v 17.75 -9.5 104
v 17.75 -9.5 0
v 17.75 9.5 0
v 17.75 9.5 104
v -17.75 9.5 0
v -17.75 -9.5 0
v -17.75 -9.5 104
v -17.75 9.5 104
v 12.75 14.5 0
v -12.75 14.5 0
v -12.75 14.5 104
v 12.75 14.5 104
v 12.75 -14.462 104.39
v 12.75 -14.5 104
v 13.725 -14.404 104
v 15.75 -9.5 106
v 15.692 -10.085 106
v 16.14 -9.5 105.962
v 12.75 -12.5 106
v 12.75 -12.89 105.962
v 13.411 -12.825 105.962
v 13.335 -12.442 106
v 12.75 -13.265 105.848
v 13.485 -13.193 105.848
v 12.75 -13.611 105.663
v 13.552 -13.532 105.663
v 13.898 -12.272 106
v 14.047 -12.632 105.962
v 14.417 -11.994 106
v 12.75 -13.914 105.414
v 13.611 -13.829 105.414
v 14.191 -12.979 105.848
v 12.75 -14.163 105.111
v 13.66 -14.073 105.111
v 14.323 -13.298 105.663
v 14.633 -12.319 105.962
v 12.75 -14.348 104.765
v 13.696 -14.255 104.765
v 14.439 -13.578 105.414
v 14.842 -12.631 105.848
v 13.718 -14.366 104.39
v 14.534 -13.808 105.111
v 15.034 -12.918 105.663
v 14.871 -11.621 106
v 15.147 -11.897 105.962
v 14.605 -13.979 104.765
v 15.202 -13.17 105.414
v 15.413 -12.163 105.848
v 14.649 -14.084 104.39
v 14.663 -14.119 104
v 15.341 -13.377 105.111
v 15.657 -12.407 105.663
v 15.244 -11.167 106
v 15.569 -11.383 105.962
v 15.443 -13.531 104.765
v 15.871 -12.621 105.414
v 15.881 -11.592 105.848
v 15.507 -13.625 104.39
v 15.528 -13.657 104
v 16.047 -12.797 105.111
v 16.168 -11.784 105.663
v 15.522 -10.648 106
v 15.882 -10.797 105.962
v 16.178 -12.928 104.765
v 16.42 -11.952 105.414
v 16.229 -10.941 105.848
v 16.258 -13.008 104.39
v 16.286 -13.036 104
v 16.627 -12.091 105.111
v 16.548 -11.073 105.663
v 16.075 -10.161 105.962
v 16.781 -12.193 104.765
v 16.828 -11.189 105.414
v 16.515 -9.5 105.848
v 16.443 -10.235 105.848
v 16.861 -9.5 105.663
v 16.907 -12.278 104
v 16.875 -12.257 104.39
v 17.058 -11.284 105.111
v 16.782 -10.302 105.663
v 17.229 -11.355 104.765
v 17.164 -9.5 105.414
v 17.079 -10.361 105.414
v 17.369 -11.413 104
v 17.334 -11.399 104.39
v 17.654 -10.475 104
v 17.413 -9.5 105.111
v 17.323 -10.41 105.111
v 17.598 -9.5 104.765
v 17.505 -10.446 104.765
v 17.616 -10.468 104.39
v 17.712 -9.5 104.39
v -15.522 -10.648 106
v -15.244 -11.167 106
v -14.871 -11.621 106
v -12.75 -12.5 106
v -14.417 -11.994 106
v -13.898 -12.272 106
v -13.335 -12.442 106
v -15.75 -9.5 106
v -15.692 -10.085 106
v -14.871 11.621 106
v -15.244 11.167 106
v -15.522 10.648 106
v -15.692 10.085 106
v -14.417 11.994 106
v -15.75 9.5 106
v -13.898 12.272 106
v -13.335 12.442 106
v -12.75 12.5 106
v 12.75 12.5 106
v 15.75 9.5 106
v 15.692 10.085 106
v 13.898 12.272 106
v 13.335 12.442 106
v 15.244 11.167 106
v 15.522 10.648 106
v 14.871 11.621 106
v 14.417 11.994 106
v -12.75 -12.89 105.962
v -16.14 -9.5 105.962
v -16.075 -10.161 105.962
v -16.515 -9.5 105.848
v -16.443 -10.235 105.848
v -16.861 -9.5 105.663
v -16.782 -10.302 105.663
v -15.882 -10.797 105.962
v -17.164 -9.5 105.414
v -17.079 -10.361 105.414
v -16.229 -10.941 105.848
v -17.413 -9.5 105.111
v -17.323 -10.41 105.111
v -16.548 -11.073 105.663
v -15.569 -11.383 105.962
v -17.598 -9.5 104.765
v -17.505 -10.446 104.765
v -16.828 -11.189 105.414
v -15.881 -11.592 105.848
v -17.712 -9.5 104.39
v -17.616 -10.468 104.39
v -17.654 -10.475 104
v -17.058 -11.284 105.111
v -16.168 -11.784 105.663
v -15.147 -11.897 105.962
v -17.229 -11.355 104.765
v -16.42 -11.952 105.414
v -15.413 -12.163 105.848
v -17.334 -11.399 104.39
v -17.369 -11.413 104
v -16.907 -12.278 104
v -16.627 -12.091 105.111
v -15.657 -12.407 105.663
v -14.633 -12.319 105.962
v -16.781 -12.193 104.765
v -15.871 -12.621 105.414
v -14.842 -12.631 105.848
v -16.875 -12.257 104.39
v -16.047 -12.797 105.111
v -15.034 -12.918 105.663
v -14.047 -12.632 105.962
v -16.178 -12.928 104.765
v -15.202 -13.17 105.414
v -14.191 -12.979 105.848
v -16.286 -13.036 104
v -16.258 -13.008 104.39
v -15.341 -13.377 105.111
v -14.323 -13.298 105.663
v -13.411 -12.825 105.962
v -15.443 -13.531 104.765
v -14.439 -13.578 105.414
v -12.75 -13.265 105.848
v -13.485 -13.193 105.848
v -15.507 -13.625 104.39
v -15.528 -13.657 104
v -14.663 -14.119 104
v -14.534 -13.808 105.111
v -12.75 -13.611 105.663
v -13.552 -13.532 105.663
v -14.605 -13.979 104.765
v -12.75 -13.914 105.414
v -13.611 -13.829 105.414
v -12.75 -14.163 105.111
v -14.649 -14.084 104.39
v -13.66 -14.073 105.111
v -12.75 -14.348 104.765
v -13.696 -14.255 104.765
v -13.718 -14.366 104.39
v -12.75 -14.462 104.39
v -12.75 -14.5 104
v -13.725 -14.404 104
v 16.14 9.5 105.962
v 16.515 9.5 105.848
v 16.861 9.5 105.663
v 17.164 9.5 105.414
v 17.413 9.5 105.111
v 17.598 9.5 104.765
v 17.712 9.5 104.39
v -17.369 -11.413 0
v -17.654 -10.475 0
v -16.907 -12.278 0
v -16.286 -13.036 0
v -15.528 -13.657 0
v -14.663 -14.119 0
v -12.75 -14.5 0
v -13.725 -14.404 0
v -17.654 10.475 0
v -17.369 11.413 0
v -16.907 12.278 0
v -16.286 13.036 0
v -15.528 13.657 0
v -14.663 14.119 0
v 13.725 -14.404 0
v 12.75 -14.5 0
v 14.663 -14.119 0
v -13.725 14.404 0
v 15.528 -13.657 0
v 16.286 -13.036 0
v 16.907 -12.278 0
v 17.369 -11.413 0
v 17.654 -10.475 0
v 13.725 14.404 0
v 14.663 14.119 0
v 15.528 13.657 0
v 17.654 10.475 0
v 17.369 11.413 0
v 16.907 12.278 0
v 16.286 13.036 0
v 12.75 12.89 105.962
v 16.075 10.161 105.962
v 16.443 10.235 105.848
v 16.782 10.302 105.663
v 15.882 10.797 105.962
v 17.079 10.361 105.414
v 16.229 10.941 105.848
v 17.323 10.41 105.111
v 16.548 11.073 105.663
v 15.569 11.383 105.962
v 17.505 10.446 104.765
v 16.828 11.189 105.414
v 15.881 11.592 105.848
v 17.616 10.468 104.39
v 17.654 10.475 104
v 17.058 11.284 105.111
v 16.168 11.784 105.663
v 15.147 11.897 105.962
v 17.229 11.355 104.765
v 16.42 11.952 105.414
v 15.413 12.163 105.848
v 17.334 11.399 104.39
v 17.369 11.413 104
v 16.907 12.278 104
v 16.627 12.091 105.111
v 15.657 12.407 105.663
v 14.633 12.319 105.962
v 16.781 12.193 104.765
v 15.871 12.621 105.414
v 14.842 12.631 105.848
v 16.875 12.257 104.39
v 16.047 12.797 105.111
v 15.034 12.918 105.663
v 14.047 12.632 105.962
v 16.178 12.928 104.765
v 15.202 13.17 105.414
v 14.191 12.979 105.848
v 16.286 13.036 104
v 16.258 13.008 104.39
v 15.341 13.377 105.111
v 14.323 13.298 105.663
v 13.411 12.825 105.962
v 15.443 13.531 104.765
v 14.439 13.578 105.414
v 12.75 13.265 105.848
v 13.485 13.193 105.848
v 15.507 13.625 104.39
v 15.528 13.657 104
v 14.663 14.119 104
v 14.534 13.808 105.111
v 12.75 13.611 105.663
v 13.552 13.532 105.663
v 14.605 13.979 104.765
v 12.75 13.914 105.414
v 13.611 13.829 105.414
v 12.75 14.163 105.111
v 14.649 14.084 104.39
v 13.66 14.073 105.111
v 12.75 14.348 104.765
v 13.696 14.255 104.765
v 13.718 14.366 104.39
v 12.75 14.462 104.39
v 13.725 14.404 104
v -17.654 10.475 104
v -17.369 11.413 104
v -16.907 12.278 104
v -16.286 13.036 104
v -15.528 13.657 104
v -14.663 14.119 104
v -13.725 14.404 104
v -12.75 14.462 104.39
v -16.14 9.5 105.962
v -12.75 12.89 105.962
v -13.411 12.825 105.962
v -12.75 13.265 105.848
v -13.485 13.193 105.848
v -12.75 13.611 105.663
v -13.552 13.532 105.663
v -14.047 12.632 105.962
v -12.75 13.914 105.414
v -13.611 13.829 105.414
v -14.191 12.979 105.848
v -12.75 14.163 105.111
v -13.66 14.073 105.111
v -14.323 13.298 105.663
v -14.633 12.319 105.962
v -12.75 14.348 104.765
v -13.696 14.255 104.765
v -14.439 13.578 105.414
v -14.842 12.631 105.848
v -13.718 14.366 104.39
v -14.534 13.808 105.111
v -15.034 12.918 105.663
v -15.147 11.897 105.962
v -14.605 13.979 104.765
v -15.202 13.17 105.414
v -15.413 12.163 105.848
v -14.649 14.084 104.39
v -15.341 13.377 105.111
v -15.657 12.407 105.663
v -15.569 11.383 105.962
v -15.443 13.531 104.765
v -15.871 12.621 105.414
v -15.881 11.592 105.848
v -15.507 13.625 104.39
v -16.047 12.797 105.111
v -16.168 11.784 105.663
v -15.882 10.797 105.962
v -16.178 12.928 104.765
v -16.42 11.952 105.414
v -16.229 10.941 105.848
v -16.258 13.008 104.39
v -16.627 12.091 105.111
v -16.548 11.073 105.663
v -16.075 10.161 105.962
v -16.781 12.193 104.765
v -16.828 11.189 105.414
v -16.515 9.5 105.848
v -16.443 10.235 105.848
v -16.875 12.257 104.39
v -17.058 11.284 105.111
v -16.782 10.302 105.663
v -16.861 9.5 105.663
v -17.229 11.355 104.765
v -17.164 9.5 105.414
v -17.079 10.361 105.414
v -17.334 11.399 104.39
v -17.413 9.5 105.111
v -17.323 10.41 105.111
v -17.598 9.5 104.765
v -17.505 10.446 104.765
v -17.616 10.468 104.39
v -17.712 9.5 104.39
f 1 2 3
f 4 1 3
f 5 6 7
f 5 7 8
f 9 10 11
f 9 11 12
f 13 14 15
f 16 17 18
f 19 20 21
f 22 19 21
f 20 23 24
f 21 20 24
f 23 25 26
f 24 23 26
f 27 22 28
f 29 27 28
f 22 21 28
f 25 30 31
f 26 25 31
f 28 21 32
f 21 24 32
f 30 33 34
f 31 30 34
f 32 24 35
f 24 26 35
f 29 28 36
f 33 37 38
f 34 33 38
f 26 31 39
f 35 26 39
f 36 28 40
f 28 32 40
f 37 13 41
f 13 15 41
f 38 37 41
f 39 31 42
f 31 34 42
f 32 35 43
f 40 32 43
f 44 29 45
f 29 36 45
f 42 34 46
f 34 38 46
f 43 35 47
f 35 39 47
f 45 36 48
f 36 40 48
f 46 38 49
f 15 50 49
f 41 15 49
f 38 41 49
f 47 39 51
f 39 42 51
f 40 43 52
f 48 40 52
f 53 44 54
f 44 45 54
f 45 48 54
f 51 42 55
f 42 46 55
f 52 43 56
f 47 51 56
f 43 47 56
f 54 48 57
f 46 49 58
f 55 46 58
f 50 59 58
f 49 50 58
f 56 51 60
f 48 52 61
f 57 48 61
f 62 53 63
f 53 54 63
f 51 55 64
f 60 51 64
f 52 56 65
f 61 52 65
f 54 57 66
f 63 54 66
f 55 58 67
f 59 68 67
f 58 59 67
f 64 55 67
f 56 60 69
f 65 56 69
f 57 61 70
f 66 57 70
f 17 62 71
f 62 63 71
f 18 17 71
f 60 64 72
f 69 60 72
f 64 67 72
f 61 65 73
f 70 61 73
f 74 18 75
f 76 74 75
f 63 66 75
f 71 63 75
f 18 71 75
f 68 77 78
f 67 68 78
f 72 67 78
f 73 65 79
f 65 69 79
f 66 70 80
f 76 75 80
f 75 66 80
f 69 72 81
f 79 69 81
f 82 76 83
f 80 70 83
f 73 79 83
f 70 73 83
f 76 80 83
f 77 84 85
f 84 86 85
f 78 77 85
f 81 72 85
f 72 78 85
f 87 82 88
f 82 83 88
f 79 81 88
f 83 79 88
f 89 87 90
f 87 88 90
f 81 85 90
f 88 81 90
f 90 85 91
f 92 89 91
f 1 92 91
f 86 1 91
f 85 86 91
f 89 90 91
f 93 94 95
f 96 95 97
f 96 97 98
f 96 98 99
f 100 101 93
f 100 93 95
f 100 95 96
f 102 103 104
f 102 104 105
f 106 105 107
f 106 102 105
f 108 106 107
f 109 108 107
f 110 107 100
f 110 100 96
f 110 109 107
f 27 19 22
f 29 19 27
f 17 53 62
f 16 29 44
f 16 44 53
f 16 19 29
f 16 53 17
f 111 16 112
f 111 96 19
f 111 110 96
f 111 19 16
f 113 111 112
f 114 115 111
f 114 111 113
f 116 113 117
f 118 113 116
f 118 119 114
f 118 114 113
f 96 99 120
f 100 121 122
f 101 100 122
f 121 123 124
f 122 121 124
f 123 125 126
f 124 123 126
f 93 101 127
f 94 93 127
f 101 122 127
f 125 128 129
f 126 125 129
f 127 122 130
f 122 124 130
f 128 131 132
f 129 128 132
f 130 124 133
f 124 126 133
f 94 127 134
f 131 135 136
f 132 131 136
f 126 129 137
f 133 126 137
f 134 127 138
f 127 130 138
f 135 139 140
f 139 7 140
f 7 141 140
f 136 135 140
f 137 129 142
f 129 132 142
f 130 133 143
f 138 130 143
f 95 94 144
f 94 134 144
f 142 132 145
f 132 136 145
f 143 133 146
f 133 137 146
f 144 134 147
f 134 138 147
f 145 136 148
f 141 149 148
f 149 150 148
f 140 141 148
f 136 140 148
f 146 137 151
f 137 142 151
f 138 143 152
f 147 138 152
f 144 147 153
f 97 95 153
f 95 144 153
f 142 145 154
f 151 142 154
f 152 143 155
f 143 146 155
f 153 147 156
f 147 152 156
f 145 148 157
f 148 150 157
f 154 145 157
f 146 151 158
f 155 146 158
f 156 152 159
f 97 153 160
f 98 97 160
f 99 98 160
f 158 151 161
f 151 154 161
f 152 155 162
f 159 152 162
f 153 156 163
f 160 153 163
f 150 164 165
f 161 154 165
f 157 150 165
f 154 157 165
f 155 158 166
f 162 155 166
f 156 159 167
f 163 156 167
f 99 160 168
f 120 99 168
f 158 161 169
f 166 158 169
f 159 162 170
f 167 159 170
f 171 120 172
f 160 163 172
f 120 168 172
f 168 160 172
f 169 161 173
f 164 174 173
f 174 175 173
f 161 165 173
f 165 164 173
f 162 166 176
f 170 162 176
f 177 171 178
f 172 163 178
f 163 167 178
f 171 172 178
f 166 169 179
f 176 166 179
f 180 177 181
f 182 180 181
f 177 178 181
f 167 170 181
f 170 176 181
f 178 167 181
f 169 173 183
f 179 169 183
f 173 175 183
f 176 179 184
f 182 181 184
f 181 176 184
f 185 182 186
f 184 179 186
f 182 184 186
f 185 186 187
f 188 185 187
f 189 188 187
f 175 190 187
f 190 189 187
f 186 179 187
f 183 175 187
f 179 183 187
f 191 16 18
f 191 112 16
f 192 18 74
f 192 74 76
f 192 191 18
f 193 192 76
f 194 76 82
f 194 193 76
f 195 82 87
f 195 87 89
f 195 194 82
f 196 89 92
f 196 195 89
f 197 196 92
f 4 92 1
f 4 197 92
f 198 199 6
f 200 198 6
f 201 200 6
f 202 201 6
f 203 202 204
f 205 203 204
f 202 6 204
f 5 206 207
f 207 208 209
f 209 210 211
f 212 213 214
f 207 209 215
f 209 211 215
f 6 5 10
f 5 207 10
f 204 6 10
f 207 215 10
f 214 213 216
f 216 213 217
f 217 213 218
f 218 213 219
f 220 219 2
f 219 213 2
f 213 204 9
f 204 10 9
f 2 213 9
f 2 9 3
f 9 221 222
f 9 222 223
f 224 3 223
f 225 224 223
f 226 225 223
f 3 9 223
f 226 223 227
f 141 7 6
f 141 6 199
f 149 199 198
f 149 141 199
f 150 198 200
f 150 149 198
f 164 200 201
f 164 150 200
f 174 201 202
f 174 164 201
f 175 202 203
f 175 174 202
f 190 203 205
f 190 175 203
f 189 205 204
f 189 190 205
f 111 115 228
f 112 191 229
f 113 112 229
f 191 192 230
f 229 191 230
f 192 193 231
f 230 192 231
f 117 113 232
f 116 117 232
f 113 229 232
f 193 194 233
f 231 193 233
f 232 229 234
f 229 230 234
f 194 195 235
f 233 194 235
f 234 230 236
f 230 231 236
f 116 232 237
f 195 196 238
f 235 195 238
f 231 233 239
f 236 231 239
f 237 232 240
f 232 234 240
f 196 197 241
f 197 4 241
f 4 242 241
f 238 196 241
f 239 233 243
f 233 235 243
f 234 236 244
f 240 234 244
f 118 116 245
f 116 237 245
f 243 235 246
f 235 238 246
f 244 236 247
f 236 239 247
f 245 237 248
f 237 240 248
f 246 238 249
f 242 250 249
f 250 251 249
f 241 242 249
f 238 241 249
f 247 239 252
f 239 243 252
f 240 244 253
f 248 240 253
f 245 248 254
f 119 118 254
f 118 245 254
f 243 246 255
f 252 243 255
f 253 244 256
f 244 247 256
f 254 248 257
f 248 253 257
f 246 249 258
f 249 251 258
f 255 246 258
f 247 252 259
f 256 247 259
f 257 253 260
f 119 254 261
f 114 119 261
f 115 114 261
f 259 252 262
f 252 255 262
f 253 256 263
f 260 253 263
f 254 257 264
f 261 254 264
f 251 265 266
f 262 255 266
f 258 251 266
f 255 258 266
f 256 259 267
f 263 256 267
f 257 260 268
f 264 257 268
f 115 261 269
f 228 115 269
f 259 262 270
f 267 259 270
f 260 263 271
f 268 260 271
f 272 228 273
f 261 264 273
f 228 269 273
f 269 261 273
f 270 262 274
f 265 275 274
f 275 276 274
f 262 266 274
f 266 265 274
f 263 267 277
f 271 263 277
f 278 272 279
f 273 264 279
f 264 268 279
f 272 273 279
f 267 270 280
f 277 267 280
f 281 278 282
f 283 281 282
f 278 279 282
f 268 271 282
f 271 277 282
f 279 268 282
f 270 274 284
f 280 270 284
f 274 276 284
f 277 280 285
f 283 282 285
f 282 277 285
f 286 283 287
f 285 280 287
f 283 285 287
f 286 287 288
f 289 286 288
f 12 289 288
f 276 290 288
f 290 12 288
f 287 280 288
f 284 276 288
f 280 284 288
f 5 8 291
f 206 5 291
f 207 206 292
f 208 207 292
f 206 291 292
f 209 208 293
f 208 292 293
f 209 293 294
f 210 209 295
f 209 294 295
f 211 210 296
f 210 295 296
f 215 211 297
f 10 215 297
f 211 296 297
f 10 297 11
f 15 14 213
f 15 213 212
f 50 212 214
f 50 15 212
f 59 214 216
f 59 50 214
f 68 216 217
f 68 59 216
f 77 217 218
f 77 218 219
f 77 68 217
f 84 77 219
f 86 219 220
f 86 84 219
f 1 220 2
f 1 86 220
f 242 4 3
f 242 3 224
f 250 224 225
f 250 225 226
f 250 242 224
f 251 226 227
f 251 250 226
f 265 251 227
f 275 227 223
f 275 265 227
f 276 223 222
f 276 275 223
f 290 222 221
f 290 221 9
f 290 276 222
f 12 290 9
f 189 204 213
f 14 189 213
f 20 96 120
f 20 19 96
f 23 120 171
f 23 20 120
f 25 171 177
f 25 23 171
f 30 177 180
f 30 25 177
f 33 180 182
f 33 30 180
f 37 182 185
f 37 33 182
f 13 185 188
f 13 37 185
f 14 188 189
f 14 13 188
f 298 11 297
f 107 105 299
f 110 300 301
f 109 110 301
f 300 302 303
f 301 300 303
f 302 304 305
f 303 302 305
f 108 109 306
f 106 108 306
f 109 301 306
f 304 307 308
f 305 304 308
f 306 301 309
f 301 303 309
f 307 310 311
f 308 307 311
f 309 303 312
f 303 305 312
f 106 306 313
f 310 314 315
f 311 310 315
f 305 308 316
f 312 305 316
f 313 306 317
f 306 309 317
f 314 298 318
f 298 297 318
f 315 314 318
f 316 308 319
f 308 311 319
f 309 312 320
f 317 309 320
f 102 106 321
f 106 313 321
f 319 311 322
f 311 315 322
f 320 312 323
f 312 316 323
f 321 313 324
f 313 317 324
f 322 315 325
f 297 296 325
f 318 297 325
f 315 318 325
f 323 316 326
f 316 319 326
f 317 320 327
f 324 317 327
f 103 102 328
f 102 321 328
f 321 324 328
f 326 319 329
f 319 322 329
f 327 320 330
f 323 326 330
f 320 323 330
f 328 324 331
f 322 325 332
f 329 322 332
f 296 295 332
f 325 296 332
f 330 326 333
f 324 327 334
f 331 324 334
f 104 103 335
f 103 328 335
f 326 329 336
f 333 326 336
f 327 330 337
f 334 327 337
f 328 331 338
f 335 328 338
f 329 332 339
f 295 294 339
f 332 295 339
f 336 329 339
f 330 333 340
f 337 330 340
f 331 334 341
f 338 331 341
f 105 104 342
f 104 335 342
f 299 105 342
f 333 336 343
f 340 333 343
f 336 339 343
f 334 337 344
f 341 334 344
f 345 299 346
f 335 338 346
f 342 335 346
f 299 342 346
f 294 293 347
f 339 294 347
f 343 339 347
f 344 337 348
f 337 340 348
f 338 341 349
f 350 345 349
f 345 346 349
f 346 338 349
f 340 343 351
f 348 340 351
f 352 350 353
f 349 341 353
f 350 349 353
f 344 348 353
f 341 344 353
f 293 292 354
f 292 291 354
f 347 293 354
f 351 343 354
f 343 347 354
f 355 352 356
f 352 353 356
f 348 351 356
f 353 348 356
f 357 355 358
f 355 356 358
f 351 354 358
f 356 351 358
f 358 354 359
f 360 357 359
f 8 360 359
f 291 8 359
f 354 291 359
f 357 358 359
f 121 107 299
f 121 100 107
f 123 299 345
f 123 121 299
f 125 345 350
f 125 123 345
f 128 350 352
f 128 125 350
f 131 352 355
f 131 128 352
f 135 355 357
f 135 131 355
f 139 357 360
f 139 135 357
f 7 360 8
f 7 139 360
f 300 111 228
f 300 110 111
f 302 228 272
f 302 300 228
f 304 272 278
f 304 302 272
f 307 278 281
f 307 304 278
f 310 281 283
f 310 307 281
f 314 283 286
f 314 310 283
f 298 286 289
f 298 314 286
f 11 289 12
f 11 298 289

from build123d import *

# Parameters (mm, degrees)
SKETCH_1_W      = 35.5
SKETCH_1_H      = 29
EXTRUDE_1_DEPTH = 106
FILLET_1_R      = 5
FILLET_2_R      = 2


with BuildPart() as part:
    # 草图1 → 凸台-拉伸1 (new body)
    with BuildSketch(Plane.XY):
        Rectangle(SKETCH_1_W, SKETCH_1_H)
    extrude(amount=EXTRUDE_1_DEPTH)

    # 圆角1
    fillet_1_edges = [part.edges().sort_by_distance(p)[0] for p in [
        (17.75, -14.5, 53),
        (-17.75, -14.5, 53),
        (-17.75, 14.5, 53),
        (17.75, 14.5, 53),
    ]]
    fillet(fillet_1_edges, radius=FILLET_1_R)

    # 圆角2
    fillet_2_edges = [part.edges().sort_by_distance(p)[0] for p in [
        (17.75, 0, 106),
        (0, -14.5, 106),
        (0, 14.5, 106),
        (-17.75, 0, 106),
        (16.285533906, 13.035533906, 106),
        (-16.285533906, 13.035533906, 106),
        (-16.285533906, -13.035533906, 106),
        (16.285533906, -13.035533906, 106),
    ]]
    fillet(fillet_2_edges, radius=FILLET_2_R)


solid = part.part
